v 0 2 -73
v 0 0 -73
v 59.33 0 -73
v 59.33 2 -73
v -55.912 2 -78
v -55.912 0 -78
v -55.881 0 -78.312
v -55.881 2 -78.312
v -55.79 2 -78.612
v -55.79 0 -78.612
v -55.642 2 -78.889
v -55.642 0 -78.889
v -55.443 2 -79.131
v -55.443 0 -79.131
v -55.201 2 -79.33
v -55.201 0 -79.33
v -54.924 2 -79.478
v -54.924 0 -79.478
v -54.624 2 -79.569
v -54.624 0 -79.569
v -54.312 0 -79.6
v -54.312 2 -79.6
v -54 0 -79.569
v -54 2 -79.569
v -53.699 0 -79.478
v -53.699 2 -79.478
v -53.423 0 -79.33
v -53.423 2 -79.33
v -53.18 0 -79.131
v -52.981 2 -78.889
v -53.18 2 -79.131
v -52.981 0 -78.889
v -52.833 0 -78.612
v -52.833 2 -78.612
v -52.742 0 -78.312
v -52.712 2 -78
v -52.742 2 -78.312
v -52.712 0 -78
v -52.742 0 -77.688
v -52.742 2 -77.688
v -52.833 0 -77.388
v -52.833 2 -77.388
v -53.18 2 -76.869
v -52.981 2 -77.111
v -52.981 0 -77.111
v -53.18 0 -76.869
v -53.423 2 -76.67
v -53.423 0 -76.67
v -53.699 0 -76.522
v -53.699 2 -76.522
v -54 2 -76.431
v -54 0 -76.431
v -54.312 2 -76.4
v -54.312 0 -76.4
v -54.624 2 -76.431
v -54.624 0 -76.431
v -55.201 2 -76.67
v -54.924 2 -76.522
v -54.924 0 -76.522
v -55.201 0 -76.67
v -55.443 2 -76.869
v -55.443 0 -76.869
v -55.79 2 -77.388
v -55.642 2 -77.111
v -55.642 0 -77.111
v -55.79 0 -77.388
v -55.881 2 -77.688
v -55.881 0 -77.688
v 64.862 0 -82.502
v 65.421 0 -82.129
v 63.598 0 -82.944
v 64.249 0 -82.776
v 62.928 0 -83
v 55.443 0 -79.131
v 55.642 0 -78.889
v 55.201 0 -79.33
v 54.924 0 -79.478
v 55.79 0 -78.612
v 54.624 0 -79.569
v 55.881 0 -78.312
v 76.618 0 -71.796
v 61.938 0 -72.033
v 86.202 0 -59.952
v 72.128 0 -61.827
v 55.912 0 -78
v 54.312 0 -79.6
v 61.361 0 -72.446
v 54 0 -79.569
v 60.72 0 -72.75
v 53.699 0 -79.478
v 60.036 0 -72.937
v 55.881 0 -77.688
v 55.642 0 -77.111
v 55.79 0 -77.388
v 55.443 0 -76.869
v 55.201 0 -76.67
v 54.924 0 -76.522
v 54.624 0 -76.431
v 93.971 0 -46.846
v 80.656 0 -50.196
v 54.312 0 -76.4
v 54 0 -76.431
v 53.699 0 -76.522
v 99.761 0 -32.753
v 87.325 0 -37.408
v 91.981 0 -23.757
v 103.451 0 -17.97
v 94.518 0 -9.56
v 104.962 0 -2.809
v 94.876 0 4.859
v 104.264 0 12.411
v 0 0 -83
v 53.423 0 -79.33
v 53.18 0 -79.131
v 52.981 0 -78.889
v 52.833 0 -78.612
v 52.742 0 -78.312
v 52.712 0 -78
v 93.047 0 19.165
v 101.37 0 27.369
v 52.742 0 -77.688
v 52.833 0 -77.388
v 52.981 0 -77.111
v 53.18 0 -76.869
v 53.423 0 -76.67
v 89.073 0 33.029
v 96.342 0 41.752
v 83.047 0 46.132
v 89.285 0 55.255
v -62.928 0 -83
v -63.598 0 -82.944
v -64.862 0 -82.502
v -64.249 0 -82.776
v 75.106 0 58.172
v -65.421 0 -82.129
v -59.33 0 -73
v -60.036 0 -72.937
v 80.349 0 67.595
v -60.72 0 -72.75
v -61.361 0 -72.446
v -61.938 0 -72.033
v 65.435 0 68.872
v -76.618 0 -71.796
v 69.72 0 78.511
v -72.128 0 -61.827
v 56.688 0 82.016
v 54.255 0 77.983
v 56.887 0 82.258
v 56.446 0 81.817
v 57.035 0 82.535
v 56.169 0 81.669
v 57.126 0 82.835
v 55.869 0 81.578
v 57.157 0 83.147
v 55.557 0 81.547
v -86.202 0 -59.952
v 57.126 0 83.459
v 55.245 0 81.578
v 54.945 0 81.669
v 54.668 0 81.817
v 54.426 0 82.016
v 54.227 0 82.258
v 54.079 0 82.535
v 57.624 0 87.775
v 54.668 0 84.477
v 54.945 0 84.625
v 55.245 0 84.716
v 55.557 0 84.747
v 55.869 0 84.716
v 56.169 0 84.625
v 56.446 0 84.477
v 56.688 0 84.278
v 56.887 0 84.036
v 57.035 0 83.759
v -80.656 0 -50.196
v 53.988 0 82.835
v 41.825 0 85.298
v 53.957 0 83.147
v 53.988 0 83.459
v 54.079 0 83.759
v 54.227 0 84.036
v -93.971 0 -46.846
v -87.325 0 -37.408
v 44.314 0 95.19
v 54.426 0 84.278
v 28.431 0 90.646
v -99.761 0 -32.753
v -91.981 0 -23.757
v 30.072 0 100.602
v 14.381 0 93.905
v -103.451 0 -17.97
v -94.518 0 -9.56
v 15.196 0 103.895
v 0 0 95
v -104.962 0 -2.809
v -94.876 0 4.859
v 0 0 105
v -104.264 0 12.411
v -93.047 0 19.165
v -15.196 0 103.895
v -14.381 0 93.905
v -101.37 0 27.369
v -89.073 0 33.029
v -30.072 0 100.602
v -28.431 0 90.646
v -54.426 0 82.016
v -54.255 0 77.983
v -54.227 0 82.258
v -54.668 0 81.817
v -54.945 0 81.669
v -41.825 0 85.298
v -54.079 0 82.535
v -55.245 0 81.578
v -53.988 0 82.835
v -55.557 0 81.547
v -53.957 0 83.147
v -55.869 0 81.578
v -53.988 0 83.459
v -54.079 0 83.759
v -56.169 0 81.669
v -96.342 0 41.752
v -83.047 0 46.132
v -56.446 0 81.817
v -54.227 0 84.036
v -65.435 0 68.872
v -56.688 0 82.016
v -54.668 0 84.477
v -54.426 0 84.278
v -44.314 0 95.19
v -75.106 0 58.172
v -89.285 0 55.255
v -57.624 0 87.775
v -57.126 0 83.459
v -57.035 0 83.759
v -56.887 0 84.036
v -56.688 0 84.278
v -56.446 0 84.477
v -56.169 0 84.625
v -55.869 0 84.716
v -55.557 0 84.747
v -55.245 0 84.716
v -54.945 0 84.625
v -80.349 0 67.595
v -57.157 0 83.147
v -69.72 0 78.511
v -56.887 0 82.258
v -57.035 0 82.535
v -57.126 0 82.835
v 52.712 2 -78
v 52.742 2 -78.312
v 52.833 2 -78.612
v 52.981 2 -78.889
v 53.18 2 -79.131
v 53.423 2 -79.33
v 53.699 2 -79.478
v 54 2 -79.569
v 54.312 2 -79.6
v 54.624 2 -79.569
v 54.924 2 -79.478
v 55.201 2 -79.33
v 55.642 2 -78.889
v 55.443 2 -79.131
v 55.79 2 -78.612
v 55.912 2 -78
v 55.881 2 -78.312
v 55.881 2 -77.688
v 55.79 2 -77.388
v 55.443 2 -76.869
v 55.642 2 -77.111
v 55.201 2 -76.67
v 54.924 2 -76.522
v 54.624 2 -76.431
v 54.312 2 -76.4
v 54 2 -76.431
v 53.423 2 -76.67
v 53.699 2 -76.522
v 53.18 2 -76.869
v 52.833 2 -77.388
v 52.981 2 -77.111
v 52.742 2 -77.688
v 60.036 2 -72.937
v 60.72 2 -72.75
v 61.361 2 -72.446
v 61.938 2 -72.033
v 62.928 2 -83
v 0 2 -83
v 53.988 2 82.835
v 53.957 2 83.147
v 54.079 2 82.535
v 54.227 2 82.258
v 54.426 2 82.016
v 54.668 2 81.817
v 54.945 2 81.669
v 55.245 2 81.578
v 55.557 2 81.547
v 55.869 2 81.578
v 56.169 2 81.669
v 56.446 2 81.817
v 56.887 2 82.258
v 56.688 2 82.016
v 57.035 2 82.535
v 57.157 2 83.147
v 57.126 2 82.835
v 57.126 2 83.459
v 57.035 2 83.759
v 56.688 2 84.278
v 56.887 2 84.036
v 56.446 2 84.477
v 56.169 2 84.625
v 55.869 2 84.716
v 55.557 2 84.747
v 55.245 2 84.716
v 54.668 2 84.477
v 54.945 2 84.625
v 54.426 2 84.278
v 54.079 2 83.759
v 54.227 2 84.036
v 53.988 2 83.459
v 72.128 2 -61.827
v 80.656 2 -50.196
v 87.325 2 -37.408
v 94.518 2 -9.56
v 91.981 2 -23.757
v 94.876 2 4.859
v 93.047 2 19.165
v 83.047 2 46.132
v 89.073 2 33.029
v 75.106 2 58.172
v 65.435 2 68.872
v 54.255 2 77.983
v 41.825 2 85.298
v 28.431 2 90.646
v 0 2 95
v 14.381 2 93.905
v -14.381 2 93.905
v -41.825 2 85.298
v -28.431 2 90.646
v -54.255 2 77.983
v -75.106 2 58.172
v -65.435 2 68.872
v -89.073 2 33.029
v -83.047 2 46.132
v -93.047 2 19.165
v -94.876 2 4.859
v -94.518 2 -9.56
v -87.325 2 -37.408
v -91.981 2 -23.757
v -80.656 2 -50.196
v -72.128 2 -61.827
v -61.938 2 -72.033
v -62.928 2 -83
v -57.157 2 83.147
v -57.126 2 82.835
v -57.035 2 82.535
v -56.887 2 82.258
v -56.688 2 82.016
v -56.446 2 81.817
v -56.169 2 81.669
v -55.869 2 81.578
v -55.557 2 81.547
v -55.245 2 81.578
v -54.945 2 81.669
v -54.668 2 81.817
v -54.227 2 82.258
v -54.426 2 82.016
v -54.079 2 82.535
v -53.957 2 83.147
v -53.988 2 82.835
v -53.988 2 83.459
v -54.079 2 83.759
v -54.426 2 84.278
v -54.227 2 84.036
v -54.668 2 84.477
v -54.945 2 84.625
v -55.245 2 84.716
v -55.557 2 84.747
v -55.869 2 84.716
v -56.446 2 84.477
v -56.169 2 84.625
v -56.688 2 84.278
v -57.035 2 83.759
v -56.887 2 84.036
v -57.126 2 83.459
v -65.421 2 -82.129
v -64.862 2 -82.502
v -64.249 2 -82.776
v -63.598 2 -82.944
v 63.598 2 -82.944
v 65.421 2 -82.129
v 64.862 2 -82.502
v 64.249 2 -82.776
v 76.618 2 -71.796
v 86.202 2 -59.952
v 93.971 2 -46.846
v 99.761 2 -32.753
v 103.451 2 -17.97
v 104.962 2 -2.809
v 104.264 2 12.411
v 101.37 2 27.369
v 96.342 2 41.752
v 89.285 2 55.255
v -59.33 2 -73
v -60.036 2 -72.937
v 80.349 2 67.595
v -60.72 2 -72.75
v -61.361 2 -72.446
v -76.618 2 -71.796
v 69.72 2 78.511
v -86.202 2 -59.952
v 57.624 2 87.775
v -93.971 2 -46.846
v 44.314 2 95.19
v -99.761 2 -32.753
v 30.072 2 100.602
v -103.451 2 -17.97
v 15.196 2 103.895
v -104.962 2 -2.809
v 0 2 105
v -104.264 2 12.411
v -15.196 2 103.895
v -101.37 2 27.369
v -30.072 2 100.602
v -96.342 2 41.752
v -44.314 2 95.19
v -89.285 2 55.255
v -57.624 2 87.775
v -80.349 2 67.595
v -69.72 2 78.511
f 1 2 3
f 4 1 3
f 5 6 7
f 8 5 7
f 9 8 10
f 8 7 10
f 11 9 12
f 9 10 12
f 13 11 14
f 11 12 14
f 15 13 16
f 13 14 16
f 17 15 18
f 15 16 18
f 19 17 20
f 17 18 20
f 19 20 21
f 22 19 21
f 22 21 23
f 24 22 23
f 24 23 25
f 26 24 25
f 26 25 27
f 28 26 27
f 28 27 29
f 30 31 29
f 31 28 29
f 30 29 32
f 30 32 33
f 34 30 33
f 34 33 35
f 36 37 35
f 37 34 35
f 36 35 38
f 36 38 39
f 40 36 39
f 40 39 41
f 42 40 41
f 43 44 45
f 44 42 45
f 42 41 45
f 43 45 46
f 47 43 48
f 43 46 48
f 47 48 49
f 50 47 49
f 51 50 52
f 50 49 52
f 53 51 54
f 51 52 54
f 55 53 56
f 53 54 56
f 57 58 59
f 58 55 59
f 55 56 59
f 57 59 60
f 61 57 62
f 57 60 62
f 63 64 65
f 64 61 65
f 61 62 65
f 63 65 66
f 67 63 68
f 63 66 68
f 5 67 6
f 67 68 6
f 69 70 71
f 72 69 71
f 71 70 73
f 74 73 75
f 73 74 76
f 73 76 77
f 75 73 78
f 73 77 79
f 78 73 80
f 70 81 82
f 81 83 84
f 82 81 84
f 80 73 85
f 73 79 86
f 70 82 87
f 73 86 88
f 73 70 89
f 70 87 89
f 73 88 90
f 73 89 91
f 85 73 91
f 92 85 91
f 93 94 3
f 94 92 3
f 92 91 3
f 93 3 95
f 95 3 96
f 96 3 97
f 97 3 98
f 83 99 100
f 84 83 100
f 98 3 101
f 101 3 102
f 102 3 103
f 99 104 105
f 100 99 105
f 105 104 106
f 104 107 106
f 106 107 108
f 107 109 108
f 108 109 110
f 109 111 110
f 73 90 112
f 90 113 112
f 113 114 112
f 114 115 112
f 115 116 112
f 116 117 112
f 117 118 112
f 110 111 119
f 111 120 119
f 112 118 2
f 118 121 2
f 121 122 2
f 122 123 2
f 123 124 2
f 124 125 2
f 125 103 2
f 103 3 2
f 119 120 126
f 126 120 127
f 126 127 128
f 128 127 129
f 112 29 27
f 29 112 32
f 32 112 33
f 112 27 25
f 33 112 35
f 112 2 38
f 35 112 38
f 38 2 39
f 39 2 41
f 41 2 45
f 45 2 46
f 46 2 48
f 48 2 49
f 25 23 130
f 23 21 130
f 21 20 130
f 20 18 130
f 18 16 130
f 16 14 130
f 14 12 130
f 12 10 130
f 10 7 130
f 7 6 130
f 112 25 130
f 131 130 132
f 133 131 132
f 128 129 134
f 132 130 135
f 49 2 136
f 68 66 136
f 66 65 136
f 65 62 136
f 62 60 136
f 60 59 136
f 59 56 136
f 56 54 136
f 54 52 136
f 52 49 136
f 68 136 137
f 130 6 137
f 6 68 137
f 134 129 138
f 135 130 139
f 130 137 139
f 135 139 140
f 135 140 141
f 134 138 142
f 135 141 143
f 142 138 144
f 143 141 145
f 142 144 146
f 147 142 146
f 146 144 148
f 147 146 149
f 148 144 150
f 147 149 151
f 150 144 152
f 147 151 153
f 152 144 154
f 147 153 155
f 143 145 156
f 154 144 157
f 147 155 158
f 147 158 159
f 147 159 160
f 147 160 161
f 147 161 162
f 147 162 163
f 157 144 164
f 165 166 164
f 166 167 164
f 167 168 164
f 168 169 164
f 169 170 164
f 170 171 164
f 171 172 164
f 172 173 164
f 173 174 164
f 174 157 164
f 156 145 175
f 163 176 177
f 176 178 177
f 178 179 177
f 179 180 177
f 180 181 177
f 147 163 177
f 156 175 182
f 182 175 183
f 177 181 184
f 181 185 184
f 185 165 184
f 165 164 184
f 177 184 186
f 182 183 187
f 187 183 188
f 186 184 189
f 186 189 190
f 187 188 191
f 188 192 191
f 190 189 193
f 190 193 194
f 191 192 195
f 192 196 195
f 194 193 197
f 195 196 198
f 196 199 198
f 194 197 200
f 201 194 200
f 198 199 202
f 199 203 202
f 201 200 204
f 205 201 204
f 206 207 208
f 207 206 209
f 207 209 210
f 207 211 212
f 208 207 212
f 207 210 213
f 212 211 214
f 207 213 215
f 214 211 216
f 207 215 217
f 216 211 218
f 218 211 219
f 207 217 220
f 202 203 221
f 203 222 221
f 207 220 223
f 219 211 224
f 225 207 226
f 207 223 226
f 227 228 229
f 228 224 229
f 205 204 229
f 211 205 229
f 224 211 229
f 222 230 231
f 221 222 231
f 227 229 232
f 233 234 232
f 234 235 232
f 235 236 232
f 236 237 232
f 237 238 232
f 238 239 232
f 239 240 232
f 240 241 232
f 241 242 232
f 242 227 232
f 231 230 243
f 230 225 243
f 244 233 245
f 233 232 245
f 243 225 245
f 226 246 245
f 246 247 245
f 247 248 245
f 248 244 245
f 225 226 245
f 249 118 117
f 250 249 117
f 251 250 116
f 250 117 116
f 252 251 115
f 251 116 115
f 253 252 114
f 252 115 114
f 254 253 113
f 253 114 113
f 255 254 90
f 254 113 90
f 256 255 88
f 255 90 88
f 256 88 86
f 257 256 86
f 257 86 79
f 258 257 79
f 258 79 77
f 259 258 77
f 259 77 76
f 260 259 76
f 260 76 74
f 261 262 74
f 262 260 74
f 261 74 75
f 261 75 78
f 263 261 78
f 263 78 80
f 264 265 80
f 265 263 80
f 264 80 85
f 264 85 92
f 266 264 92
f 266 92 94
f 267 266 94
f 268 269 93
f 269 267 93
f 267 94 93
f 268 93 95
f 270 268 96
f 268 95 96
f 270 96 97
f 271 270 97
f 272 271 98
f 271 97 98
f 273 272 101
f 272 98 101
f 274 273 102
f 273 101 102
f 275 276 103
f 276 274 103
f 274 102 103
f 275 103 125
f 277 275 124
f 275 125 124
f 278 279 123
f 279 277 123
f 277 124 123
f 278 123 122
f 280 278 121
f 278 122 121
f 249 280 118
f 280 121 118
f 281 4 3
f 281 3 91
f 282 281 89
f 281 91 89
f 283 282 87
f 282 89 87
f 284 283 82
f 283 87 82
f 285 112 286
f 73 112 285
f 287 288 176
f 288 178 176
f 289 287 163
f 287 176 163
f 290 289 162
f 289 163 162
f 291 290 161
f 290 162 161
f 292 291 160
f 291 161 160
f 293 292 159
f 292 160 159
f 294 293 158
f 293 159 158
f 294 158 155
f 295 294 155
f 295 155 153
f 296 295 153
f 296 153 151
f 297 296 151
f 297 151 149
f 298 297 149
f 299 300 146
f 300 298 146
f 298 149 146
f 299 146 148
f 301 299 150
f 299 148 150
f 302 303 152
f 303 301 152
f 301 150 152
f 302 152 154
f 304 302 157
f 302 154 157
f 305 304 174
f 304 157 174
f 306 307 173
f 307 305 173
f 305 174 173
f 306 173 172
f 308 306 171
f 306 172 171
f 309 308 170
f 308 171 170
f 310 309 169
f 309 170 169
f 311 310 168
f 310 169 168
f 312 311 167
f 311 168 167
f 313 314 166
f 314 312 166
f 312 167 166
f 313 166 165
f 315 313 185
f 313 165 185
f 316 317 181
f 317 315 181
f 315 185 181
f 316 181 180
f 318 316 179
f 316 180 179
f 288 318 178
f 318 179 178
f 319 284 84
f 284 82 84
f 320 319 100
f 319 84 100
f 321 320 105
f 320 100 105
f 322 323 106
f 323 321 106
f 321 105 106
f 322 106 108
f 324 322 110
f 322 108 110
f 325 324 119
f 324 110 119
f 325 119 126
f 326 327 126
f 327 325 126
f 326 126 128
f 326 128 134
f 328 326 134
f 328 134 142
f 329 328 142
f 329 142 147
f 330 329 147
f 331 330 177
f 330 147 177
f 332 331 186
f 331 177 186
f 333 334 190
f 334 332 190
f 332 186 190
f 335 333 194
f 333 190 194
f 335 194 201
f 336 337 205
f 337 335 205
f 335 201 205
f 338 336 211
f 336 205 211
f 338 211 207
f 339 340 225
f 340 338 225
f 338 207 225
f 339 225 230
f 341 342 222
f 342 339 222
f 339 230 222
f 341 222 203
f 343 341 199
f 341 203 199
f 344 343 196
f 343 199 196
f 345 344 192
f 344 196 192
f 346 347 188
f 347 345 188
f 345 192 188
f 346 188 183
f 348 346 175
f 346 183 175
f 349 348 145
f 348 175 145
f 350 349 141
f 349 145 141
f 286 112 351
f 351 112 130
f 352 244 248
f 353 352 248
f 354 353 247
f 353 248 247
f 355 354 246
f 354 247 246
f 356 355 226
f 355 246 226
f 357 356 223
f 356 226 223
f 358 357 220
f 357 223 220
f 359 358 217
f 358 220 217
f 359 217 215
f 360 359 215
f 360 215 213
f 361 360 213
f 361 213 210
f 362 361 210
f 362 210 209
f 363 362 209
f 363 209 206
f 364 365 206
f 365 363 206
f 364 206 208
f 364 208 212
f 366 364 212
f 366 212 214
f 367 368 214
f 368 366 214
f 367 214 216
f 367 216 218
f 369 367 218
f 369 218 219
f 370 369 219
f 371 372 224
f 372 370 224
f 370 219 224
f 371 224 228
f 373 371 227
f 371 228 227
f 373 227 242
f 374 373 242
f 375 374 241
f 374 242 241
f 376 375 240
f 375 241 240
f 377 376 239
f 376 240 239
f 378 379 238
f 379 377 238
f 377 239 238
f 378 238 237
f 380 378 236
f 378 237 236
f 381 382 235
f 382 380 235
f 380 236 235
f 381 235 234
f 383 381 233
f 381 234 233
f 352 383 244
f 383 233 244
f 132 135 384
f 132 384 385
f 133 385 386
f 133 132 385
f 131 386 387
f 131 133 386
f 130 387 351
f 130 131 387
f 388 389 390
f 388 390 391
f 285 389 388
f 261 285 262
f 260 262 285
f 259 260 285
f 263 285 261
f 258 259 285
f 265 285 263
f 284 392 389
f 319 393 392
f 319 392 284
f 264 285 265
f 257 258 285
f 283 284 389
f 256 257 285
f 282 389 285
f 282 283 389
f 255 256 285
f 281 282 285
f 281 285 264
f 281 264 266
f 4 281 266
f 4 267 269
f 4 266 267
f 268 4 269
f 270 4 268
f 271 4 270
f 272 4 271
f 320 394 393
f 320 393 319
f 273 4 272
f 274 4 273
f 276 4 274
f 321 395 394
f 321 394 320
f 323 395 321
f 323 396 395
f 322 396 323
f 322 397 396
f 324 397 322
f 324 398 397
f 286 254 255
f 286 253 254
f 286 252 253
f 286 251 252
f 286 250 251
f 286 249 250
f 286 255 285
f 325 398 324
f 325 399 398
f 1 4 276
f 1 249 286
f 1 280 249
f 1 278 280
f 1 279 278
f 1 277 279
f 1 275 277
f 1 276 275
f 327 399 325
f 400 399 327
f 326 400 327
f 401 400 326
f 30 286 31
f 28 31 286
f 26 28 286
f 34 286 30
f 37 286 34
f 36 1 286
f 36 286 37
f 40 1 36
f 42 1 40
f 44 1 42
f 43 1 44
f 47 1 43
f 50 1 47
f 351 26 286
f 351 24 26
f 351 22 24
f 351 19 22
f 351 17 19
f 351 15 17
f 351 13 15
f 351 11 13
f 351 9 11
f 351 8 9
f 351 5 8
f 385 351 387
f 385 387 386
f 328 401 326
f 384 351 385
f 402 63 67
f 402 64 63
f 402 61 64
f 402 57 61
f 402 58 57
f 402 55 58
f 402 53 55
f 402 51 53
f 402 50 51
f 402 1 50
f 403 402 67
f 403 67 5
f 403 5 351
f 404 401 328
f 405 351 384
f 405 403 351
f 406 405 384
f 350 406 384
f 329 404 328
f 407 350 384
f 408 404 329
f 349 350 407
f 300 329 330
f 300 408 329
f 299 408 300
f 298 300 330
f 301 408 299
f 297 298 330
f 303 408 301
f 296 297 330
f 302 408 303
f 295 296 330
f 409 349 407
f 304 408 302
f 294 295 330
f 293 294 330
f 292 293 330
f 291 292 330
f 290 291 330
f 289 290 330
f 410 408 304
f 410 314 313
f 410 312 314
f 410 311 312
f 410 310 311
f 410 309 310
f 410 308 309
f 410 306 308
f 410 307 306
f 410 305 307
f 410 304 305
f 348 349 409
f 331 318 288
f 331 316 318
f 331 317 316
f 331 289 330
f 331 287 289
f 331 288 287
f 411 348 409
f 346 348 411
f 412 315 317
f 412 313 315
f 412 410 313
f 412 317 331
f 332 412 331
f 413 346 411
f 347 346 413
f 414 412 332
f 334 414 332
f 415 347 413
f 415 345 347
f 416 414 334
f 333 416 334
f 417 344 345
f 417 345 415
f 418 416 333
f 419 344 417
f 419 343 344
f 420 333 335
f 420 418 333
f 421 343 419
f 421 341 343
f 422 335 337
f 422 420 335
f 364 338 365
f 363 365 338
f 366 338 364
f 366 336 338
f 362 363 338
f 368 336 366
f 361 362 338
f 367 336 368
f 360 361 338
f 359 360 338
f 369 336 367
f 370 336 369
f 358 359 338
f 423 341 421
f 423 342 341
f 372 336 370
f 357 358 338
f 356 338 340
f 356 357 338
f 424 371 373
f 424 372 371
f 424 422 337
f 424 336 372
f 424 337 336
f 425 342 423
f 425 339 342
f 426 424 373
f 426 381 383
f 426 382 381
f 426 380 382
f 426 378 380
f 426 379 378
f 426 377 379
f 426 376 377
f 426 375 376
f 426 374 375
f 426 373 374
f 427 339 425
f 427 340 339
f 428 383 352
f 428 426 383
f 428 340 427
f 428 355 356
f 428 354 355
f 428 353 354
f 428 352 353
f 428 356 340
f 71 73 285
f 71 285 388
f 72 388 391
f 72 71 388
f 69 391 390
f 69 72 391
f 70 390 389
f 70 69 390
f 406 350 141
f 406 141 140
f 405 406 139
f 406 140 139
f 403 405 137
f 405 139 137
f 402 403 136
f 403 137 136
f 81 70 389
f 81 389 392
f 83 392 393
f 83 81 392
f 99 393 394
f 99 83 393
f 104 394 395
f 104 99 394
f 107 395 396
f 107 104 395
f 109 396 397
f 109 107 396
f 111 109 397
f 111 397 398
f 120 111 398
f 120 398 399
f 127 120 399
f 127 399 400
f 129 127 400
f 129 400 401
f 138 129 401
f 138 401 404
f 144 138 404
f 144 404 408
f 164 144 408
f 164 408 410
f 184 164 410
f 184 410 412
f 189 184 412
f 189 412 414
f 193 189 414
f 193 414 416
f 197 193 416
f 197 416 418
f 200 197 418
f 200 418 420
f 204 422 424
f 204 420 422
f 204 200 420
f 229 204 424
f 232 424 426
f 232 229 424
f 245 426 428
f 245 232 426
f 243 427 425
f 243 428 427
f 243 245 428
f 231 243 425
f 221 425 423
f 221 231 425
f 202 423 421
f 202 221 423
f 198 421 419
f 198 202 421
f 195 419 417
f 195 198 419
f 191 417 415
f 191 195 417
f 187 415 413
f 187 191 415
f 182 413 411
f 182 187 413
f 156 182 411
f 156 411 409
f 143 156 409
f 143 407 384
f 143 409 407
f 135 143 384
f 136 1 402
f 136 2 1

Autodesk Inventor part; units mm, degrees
ref_plane "YZ Plane" through (0, 0, 0) normal (1, 0, 0) x (0, 1, 0)
ref_plane "XZ Plane" through (0, 0, 0) normal (0, 1, 0) x (-1, 0, 0)
ref_plane "XY Plane" through (0, 0, 0) normal (0, 0, 1) x (1, 0, 0)
sketch "Sketch1" plane through (0, 0, 0) normal (0, 1, 0) x (-1, 0, 0)
  line L0 (0, -83) -> (62.9285, -83)
  line L1 (0, -83) -> (-62.9285, -83)
  line L2 (0, -73) -> (59.3296, -73)
  line L3 (0, -73) -> (-59.3296, -73)
  arc A0 (65.4207, -82.1287) -> (-65.4207, -82.1287) centre (0, 0) ccw
  arc A1 (61.9375, -72.033) -> (-61.9375, -72.033) centre (0, 0) ccw
  arc A2 (59.3296, -73) -> (61.9375, -72.033) centre (59.3296, -69) ccw
  arc A3 (62.9285, -83) -> (65.4207, -82.1287) centre (62.9285, -79) ccw
  arc A4 (-65.4207, -82.1287) -> (-62.9285, -83) centre (-62.9285, -79) ccw
  arc A5 (-61.9375, -72.033) -> (-59.3296, -73) centre (-59.3296, -69) ccw
  circle A6 centre (55.557, 83.147) radius 1.6
  circle A7 centre (-55.557, 83.147) radius 1.6
  circle A8 centre (54.3117, -78) radius 1.6
  circle A9 centre (-54.3117, -78) radius 1.6
  point P0 (64.3117, -83)
  point P1 (-64.3117, -83)
  point P2 (60.7947, -73)
  point P3 (-60.7947, -73)
  dimension "d3" = 10
  dimension "d6" = 3.2
  dimension "d9" = 3.2
  dimension "d10" = 3.2
extrude "Extrusion1" add sketch "Sketch1" along normal blind 2
properties part number "Handle Ring"
